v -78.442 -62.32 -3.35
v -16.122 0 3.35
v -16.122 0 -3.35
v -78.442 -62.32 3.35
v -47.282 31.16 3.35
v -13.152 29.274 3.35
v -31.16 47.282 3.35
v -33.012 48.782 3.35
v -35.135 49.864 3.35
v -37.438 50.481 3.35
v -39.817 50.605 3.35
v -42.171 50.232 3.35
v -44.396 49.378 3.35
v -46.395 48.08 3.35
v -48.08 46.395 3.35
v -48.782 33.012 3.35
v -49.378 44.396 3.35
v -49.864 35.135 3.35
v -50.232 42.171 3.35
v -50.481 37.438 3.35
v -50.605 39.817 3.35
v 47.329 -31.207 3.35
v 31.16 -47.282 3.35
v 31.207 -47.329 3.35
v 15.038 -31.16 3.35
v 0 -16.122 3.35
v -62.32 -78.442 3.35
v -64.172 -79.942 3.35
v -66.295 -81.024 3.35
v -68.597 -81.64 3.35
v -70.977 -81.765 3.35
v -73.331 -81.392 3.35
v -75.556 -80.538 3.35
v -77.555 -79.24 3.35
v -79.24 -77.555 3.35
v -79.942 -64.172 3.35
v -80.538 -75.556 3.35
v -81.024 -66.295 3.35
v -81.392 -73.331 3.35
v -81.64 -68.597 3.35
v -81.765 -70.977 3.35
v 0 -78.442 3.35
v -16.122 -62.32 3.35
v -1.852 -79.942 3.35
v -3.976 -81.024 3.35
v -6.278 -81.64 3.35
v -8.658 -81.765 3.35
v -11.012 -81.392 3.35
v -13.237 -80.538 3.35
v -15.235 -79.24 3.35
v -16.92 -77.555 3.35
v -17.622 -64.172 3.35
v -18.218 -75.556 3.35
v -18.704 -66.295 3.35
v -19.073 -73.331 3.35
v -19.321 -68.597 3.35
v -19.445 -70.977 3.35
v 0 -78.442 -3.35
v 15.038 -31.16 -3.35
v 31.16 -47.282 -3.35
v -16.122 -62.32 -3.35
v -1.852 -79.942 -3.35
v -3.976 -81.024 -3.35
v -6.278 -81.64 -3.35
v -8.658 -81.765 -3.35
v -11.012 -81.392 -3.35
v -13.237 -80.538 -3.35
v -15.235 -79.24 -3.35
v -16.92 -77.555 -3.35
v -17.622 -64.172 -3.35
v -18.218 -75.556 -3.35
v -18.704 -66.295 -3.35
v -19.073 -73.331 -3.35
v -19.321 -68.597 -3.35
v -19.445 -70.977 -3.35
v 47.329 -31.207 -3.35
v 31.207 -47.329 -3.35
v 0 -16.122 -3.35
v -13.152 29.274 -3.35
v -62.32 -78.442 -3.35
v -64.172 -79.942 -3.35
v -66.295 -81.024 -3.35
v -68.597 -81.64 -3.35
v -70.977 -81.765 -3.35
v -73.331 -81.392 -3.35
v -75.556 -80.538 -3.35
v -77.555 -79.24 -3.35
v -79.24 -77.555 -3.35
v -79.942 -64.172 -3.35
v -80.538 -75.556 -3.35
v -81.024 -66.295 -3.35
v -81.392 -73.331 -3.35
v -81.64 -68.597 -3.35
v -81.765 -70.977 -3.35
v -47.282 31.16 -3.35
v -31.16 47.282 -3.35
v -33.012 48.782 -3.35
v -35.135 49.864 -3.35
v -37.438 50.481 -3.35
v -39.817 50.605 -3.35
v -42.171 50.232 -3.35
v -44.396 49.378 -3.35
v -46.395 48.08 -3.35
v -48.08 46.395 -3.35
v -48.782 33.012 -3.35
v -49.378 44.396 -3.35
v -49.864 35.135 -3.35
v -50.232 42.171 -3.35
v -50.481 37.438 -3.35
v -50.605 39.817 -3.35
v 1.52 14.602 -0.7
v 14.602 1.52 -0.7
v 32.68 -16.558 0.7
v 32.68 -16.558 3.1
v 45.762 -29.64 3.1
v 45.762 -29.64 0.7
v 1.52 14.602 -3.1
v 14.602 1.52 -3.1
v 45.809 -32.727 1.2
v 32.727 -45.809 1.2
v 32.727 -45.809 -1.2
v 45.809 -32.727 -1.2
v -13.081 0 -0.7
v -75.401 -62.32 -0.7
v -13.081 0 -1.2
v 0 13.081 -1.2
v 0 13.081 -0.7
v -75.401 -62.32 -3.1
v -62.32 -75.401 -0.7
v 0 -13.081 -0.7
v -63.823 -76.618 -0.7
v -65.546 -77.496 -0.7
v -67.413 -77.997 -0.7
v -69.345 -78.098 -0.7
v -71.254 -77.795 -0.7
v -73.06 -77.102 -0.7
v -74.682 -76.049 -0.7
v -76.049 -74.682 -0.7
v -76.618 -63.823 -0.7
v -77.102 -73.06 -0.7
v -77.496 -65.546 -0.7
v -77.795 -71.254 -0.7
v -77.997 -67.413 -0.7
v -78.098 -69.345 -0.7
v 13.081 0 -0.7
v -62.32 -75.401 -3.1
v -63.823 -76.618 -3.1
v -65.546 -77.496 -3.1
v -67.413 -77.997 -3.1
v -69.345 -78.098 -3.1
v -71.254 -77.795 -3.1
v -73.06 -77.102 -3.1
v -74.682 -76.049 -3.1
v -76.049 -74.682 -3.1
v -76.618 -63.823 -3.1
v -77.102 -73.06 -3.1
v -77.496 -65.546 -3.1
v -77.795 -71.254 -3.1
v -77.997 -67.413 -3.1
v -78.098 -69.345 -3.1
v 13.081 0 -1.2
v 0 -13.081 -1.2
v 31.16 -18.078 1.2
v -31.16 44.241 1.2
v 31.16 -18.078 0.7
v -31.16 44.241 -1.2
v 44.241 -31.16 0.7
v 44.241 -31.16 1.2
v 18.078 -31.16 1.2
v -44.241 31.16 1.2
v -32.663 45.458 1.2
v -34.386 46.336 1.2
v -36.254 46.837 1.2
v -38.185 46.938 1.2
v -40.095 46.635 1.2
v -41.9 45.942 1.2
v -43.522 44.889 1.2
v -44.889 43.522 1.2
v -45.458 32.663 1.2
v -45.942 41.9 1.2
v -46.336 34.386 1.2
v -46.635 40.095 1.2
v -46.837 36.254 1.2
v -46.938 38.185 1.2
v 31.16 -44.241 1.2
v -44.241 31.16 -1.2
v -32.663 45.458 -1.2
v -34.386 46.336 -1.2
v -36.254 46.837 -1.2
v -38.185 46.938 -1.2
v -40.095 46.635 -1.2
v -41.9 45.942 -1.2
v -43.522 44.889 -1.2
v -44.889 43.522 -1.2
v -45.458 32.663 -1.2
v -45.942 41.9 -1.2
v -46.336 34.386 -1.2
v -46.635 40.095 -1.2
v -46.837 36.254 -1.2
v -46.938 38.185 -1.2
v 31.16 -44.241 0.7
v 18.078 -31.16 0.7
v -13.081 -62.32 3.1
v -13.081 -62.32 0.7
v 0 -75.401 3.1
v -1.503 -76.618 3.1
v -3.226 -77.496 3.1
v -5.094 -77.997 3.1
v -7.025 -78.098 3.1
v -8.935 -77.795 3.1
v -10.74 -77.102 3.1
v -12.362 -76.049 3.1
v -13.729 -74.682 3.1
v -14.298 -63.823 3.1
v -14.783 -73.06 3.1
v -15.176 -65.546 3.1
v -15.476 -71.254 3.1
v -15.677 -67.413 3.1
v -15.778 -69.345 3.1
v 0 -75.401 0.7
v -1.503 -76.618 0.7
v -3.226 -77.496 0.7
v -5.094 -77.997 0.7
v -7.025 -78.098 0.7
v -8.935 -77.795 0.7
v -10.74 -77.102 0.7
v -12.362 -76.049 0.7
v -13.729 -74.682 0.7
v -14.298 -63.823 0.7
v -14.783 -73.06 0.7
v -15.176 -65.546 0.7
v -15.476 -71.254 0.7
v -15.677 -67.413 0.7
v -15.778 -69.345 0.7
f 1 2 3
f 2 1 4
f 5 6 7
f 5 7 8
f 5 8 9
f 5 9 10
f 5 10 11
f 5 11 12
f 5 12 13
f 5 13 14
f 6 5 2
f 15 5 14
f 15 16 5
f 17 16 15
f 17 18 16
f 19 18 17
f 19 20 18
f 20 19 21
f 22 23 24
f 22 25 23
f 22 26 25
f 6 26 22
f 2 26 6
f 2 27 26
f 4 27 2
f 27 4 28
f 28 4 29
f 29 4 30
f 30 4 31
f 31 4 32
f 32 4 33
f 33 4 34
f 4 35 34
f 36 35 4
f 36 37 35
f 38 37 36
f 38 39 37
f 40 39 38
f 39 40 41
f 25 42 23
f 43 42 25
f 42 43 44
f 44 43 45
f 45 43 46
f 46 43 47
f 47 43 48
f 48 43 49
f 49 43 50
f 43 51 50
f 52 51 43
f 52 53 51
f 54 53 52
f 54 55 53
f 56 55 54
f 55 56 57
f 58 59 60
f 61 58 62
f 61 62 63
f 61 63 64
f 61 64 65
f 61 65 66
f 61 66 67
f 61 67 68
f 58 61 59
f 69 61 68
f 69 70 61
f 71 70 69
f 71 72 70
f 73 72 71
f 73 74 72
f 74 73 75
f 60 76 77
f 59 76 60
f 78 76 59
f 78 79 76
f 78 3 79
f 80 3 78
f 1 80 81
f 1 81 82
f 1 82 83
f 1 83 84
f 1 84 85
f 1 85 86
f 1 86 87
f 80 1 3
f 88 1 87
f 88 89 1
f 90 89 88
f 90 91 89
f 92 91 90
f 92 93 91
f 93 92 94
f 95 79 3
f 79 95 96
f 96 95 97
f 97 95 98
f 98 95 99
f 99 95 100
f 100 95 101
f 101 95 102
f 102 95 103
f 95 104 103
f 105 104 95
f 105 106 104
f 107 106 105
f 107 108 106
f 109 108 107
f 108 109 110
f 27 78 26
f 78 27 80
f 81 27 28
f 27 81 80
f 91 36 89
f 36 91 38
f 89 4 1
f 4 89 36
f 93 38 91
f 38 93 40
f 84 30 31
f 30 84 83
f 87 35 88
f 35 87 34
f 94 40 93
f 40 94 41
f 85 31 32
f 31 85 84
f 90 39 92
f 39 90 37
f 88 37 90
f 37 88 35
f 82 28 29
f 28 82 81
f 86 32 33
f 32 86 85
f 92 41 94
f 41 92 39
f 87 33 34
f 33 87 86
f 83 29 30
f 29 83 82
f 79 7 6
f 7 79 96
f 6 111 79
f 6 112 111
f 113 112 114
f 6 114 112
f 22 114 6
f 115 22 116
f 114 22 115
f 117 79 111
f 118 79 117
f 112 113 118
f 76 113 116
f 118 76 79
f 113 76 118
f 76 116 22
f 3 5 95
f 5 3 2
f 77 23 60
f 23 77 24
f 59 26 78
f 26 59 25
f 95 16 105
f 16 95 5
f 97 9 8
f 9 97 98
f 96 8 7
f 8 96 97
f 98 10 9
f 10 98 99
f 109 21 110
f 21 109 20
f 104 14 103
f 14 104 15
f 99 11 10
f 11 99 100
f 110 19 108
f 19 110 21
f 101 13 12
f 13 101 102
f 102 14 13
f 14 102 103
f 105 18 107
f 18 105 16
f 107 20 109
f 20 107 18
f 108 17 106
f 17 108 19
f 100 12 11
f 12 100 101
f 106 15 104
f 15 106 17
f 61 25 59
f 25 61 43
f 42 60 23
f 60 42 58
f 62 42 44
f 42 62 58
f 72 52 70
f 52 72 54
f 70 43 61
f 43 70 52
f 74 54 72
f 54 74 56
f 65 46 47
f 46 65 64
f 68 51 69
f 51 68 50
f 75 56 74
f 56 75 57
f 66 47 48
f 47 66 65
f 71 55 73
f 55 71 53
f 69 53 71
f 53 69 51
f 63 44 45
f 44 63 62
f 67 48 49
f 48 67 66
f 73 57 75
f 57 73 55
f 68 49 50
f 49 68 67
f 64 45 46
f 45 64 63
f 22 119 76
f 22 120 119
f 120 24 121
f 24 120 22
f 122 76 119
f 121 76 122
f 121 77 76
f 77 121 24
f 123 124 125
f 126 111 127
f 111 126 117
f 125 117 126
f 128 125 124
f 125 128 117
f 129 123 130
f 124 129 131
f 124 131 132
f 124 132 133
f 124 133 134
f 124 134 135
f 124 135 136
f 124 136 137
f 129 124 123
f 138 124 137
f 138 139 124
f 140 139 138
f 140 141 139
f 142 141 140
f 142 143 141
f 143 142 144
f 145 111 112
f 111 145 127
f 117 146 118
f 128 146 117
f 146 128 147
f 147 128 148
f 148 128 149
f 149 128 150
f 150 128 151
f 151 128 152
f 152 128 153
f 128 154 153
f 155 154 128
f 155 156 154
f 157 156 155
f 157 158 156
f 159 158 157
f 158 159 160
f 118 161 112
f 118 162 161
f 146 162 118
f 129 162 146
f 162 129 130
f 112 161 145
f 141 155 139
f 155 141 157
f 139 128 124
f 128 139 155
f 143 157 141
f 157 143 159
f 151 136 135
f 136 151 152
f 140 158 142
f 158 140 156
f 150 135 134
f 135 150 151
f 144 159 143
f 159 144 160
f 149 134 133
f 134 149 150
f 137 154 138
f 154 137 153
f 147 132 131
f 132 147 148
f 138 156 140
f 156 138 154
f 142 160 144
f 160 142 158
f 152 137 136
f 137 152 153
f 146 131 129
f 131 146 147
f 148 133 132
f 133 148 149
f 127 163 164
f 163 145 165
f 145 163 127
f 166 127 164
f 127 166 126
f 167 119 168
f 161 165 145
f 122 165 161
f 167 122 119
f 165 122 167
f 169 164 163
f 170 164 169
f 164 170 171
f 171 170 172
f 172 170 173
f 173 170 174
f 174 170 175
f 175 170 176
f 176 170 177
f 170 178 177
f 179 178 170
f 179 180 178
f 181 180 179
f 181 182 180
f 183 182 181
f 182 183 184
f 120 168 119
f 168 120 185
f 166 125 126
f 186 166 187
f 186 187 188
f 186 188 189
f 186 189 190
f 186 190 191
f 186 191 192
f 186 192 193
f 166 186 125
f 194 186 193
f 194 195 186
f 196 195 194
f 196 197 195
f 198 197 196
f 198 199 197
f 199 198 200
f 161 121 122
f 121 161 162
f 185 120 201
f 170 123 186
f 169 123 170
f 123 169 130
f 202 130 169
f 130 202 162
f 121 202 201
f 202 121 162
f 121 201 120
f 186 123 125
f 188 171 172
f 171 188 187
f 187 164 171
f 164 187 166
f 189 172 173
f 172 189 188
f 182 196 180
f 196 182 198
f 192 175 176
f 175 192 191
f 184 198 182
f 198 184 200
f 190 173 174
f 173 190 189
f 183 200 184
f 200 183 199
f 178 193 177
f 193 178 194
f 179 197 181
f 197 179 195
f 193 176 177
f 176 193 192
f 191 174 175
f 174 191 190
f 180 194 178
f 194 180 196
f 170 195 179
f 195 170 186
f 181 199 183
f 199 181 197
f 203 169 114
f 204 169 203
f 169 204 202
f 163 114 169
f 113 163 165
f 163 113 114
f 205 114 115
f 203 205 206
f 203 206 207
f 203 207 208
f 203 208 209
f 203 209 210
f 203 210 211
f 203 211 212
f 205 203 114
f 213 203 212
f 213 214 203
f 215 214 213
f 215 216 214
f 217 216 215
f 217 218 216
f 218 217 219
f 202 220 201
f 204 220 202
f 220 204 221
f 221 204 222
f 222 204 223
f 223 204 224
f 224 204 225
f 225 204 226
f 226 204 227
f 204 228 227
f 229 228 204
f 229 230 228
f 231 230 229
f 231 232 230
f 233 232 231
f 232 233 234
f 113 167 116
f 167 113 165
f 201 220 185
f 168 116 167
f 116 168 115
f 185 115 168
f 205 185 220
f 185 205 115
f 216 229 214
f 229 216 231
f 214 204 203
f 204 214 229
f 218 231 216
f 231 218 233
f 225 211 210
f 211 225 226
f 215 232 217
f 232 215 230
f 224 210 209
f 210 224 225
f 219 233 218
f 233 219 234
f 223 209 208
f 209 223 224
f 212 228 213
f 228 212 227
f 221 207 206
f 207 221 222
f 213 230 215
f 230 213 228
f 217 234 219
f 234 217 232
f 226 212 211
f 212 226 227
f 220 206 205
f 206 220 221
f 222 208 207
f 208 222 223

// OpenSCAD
E = 0.2;
WALL = 1;
GAP = 0.7;

STICK_W = 17.8;
STICK_L = 150;
STICK_TH = 1.7;
STICK_L_C = STICK_L - STICK_W;

module stick(orient, extra) {
    length = STICK_L + extra;
    width = STICK_W + extra;
    height = STICK_TH + extra;
    rotate([0, 0, orient == "h" ? 90 : 0]) {
        cube([width, length, height], center=true);
        translate([0, -length/2, 0])
            cylinder(h=height, r=width/2, center=true);
        translate([0, length/2, 0])
            cylinder(h=height, r=width/2, center=true);
    }
}

module course(extra, offset) {
    translate([0, -STICK_L_C/6, 0])
        stick("v", extra);
    translate([STICK_L_C/6, -STICK_L_C/3, offset])
        stick("h", extra);
}

module initial(extra, offset, rot) {
    rotate([0, 0, rot]) {
        translate([-STICK_L_C/6, 0, -offset])
            stick("h", extra);
        course(extra, offset);
    }
}

module sample() {
    rotate([0, 0, 45]) {
        % for (i=[1:5]) {
            translate([i * STICK_L_C/3, -i * STICK_L_C/3, 0])
                course(2 * E, STICK_TH + E);
        }
    }
}

module holder() {
    rotate([0, 0, 45])
    difference() {
        initial(5, 0, 0);
        translate([50 + STICK_W/2 + 2.5, -20, 0])
           cube([100, 100, 10], center=true);
        translate([0, -50 - STICK_L/3 - STICK_W/3 + 0.4, 0])
           cube([100, 100, 10], center=true);
    }
}

difference() {
    holder();
    initial(GAP, STICK_TH + E, 45);
}

% initial(GAP, STICK_TH + E, 45);
sample();
